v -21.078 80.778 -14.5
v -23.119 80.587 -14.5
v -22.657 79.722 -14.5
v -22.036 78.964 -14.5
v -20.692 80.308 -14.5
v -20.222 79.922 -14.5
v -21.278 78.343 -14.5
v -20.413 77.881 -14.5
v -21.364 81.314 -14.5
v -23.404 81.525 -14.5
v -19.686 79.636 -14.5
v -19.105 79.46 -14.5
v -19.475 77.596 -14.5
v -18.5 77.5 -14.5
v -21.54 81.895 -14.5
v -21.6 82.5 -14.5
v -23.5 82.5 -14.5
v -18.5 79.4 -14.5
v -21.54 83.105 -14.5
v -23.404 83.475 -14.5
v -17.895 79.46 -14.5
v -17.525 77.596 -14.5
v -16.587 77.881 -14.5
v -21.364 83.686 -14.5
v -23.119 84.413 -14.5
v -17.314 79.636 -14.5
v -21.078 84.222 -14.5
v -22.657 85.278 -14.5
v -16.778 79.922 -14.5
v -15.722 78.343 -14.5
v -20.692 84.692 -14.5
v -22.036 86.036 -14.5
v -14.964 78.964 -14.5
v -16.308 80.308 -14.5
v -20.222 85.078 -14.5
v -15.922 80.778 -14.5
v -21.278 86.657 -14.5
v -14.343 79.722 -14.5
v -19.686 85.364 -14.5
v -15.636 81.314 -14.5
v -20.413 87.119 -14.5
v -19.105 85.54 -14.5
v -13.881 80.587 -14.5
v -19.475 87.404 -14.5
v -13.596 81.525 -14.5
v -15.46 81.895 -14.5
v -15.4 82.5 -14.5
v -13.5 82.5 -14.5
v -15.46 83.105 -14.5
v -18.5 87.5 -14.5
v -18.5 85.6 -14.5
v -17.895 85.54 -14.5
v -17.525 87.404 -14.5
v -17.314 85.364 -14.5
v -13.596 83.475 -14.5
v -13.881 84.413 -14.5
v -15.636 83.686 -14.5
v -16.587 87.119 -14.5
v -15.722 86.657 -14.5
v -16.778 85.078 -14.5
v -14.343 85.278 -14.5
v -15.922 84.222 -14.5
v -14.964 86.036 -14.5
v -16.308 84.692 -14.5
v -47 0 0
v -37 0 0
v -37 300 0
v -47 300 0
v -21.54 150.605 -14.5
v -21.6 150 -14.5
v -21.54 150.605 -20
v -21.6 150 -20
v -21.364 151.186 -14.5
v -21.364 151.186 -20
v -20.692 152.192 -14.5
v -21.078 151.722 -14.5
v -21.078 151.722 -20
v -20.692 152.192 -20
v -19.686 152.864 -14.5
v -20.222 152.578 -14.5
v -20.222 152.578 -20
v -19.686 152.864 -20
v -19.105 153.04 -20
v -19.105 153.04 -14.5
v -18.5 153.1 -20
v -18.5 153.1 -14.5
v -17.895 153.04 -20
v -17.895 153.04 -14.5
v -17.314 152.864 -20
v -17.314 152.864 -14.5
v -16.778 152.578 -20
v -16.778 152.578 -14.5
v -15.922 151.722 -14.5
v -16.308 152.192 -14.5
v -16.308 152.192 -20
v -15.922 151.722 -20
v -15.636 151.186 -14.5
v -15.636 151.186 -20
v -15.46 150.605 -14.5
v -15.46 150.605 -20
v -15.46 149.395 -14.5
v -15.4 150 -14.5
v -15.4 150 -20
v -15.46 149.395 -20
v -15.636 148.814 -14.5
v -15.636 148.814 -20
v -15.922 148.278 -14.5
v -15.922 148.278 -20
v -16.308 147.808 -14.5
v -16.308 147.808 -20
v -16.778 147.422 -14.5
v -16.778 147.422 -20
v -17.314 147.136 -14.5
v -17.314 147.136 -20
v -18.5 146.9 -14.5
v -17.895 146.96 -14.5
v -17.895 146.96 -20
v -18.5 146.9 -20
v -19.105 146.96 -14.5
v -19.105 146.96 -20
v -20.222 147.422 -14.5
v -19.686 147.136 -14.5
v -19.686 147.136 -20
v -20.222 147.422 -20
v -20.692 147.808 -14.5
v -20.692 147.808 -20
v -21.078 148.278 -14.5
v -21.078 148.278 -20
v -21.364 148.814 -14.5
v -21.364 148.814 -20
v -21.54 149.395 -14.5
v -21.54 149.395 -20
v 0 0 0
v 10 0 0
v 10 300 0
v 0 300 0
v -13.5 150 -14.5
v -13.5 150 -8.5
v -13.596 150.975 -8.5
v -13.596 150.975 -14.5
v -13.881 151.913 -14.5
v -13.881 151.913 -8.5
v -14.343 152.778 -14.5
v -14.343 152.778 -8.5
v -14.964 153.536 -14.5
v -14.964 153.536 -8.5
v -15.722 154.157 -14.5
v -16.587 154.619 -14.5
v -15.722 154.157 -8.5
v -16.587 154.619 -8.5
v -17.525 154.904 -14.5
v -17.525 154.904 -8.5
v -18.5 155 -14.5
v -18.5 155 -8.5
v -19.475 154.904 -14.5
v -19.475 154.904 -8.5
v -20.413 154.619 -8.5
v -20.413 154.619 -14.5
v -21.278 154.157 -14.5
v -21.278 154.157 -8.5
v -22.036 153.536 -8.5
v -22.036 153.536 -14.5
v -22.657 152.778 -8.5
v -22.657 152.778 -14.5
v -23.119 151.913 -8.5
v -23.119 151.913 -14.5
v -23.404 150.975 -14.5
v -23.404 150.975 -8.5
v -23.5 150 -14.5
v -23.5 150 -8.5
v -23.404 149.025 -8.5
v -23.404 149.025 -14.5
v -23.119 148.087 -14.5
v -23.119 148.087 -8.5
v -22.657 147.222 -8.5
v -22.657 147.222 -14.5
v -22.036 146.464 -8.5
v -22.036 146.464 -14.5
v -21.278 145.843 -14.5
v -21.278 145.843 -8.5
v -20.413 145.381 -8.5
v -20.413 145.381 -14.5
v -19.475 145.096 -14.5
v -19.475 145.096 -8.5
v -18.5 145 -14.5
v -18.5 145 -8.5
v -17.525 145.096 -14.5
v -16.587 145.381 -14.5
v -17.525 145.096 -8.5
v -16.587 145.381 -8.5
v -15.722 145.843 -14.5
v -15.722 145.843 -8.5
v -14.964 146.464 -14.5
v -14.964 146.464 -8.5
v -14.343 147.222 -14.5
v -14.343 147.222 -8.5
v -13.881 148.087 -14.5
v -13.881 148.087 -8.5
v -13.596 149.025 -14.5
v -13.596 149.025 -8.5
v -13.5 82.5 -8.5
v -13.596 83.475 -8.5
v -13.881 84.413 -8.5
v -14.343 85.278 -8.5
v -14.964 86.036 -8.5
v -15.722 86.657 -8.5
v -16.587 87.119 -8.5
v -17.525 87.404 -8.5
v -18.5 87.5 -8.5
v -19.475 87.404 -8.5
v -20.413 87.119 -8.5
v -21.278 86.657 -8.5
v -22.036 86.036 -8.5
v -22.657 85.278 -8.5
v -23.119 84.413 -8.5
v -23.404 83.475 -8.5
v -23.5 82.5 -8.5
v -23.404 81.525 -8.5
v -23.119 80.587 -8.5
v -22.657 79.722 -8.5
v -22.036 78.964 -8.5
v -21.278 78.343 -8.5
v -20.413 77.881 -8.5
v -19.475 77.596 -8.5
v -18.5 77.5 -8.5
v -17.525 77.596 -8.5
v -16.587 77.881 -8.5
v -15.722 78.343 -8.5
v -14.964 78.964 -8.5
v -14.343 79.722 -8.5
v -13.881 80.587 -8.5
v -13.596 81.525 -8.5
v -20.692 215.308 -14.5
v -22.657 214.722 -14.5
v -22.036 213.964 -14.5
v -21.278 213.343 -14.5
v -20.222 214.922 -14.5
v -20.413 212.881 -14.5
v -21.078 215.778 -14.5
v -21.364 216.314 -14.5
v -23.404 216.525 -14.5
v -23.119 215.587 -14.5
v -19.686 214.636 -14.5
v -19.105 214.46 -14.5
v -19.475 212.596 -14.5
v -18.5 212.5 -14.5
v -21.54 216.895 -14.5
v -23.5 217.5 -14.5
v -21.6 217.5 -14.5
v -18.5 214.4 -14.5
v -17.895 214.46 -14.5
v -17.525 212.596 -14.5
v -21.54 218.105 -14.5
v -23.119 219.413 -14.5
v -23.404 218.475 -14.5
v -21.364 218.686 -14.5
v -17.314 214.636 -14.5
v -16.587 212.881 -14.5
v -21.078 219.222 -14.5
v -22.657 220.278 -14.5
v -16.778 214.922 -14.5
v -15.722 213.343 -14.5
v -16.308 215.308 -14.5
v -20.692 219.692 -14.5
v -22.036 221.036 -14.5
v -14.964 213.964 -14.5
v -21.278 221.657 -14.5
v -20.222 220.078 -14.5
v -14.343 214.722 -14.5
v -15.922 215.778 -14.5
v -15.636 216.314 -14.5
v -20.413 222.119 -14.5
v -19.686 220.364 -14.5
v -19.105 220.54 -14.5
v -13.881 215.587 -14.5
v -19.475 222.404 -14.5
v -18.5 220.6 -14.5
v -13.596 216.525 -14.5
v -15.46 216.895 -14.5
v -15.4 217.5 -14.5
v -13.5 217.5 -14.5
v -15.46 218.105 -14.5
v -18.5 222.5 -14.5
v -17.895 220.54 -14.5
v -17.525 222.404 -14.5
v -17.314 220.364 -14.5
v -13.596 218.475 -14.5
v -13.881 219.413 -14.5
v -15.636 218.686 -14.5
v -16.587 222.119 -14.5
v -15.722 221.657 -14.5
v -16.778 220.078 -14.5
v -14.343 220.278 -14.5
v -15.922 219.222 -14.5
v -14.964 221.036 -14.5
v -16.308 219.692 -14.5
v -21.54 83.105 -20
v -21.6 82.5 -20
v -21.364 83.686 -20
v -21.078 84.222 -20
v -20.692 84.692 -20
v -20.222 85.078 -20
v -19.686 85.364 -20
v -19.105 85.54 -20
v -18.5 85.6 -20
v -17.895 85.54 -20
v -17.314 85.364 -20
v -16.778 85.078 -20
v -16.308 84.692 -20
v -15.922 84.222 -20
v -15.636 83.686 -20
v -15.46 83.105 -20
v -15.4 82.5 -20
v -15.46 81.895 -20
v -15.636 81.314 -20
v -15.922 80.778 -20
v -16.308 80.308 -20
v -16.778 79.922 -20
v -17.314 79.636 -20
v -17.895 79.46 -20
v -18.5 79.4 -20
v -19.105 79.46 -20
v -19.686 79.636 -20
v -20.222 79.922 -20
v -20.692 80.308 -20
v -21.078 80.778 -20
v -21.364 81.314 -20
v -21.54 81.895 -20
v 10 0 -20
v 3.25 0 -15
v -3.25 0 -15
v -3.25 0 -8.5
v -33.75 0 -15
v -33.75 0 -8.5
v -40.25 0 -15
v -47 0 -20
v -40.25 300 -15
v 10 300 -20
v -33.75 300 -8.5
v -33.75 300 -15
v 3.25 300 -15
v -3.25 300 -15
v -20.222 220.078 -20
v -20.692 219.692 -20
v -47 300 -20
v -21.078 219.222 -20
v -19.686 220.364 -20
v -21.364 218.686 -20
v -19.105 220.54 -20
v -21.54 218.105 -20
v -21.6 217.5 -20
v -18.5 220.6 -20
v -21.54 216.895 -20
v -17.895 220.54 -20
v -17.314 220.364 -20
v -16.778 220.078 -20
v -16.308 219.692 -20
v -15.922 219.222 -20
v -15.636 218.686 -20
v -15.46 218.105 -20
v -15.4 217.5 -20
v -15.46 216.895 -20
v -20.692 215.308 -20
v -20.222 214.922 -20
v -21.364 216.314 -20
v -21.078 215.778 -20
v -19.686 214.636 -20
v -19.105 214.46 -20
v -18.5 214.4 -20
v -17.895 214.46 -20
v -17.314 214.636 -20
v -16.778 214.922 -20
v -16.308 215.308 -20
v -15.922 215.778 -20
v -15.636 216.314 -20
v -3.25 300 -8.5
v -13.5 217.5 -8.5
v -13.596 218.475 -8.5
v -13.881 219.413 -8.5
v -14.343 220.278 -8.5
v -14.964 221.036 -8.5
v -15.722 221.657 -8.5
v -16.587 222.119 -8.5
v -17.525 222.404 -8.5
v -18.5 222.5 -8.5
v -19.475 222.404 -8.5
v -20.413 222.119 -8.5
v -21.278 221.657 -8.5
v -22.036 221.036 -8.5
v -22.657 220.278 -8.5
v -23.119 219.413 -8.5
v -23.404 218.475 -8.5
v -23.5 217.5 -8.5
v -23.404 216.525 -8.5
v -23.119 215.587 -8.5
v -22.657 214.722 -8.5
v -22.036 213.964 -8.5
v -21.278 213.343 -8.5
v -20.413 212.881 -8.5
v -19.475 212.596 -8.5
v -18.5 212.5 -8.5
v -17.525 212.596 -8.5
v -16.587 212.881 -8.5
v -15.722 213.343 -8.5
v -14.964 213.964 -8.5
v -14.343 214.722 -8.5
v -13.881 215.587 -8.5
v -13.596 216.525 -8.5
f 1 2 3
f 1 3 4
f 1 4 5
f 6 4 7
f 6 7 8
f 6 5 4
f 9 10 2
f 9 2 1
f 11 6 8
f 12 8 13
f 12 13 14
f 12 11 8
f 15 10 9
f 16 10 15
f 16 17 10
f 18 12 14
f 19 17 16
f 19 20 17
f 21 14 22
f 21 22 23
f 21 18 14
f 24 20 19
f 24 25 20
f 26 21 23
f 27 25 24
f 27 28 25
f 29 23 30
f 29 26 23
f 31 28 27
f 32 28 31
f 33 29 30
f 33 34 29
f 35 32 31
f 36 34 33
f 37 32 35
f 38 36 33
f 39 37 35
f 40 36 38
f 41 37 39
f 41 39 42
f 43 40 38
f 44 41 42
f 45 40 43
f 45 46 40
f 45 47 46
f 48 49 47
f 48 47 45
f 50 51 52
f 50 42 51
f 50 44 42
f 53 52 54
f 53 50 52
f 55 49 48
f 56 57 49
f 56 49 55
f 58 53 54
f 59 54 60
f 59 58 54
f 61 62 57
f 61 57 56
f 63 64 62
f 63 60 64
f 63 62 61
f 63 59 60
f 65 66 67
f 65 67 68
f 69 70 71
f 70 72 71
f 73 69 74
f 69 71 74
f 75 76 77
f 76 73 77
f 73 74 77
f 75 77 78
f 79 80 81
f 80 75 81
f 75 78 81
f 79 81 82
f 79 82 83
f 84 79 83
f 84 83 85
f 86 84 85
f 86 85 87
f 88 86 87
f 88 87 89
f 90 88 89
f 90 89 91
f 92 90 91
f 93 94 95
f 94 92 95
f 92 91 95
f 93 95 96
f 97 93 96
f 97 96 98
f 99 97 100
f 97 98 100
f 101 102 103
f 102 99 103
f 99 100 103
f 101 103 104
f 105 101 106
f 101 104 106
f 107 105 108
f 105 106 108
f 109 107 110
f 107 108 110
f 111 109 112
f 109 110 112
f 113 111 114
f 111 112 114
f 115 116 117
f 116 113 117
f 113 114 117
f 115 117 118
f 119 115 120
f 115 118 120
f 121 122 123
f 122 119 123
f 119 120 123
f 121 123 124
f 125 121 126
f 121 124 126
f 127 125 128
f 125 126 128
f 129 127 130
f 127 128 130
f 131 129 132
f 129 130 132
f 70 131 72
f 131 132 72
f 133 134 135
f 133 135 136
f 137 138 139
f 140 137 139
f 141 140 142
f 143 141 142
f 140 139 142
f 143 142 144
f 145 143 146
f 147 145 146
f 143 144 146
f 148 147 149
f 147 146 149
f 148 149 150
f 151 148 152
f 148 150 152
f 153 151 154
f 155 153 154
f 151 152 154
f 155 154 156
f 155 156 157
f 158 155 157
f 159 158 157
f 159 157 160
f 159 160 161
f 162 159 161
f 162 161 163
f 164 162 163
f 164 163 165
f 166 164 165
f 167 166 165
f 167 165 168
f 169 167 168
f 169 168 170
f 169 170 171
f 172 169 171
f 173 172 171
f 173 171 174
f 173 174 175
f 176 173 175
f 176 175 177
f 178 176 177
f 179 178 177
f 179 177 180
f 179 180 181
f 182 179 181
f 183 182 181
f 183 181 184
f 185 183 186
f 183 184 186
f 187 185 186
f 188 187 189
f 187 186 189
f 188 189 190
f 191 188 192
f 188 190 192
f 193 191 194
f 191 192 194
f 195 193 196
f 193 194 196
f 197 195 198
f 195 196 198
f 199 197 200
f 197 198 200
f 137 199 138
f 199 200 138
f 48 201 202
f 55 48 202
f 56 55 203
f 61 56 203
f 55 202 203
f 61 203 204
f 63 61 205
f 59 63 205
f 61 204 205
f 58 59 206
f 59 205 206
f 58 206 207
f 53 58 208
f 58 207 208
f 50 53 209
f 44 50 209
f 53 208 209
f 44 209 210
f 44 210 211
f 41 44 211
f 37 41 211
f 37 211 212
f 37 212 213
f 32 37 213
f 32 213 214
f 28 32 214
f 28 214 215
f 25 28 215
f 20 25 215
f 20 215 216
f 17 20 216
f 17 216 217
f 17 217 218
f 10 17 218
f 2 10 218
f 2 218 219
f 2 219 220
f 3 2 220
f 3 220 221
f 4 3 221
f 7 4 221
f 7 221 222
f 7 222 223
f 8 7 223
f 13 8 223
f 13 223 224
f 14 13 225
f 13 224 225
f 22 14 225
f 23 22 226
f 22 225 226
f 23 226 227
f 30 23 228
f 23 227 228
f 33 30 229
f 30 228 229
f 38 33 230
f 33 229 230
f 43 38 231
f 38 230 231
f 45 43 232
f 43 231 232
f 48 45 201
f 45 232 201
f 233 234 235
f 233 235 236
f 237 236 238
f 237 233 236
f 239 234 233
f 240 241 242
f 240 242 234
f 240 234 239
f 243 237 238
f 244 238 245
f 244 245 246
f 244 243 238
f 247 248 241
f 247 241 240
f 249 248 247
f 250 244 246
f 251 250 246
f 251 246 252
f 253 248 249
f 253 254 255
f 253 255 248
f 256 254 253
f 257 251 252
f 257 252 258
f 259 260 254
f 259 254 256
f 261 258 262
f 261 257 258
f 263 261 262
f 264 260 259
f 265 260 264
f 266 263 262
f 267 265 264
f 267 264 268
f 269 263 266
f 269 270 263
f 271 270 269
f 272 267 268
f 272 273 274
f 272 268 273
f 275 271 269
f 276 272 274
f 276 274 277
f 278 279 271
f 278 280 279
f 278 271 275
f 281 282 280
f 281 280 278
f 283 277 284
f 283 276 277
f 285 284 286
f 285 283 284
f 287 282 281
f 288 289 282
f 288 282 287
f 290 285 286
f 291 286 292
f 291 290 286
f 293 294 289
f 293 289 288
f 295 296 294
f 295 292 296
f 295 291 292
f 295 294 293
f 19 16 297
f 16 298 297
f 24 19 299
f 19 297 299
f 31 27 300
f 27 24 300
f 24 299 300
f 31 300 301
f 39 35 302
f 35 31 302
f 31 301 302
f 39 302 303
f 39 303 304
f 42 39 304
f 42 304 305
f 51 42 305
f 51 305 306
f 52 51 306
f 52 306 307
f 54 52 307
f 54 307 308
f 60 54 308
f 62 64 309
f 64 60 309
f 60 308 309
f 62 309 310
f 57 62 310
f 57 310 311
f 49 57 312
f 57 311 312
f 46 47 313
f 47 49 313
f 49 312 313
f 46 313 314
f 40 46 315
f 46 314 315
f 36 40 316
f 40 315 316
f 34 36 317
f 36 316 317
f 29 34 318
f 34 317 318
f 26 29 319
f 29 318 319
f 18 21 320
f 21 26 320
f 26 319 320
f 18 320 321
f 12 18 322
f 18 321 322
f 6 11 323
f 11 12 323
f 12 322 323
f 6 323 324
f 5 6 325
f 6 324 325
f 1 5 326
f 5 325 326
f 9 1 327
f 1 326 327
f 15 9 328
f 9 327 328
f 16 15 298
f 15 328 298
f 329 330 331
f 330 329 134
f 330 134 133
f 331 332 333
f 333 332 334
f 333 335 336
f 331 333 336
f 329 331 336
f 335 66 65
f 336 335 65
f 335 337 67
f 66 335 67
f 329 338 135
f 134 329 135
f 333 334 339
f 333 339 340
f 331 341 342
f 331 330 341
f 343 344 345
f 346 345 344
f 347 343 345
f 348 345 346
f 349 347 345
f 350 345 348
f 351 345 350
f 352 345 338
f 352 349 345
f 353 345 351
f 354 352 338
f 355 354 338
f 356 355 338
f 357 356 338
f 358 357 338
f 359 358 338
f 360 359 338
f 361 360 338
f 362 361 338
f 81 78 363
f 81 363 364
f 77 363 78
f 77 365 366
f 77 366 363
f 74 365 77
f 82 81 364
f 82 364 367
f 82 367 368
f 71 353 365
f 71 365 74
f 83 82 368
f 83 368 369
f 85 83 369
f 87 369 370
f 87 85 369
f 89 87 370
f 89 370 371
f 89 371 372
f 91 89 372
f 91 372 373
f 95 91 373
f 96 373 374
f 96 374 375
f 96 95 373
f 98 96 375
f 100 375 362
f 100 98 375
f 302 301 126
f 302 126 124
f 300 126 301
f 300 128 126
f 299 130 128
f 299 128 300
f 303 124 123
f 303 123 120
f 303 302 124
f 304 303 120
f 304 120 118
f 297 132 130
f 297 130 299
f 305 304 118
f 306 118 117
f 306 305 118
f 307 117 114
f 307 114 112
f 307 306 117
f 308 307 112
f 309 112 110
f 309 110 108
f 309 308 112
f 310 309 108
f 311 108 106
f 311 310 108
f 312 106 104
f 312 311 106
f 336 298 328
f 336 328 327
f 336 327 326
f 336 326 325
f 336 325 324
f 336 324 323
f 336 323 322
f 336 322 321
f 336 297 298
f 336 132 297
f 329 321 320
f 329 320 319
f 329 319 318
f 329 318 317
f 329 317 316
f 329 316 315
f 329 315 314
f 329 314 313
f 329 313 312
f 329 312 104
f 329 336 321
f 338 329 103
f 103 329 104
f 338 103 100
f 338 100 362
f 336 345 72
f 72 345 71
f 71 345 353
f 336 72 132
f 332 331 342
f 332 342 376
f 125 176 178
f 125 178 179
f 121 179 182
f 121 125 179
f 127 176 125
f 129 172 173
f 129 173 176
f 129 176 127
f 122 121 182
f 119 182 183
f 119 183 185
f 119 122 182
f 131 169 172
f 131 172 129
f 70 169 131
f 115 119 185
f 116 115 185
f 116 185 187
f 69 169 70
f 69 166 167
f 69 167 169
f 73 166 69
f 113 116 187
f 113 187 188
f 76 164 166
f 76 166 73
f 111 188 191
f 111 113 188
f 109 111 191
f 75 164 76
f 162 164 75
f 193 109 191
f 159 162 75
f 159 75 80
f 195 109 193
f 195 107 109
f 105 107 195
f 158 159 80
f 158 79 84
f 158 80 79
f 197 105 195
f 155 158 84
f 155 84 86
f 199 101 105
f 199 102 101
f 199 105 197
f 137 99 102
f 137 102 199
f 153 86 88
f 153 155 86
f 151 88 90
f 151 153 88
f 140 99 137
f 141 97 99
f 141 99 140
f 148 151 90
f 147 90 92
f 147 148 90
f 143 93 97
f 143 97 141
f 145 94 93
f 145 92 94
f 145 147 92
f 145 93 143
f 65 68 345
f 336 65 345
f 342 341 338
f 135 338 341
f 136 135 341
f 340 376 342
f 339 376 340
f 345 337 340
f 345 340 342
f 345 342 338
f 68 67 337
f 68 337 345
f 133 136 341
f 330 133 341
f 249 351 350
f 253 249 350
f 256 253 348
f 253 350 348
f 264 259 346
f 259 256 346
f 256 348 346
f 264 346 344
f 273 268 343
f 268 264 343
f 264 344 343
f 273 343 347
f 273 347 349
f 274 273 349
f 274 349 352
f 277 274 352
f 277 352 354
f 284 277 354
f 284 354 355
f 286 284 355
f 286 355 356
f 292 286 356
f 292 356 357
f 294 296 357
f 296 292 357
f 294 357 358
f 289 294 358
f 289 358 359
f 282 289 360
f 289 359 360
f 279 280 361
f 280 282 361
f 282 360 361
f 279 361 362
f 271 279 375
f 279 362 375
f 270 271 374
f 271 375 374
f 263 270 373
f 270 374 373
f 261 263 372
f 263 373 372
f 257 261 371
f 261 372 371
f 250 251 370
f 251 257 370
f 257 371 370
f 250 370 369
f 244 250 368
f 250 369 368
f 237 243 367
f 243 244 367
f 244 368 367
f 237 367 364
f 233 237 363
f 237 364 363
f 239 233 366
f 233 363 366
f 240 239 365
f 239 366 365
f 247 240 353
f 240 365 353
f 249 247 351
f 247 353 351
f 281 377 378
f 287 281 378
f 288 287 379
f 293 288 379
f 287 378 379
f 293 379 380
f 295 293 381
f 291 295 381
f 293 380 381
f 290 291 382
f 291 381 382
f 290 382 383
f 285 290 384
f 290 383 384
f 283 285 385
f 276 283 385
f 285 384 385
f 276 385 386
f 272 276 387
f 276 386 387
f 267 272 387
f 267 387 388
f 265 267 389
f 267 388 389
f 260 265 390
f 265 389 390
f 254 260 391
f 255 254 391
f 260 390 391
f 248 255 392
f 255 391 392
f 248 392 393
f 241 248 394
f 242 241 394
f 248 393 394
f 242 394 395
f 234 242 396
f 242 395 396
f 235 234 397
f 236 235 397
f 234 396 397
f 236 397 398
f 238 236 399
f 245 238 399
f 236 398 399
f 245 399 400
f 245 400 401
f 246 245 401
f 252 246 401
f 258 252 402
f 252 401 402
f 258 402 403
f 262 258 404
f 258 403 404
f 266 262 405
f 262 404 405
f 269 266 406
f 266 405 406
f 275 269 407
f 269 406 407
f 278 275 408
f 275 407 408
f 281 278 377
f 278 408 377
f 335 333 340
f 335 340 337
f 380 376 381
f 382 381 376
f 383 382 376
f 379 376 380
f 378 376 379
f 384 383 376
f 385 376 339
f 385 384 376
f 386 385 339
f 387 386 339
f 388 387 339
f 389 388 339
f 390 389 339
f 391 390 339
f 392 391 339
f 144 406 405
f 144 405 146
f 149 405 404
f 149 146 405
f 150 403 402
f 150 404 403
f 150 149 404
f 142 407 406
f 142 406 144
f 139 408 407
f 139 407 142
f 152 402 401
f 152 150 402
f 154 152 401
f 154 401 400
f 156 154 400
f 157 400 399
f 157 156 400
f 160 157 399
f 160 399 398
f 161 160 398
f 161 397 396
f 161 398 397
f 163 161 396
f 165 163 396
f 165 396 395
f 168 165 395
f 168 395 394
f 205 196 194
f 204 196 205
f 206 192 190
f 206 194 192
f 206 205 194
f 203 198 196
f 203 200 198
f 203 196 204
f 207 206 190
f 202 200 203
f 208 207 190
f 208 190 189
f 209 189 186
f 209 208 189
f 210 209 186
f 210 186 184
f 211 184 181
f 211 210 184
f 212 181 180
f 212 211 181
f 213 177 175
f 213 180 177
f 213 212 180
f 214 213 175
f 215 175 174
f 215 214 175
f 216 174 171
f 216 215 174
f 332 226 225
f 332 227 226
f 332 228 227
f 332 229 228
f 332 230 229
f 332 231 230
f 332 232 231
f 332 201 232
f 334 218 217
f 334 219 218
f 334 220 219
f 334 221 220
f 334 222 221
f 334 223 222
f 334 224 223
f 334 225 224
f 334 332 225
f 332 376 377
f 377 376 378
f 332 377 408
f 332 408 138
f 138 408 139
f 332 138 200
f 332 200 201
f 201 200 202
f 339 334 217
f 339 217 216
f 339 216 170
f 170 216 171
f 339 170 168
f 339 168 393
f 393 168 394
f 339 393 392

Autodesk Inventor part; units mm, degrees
ref_plane "YZ Plane" through (0, 0, 0) normal (1, 0, 0) x (0, 1, 0)
ref_plane "XZ Plane" through (0, 0, 0) normal (0, 1, 0) x (-1, 0, 0)
ref_plane "XY Plane" through (0, 0, 0) normal (0, 0, 1) x (1, 0, 0)
sketch "Sketch1" plane through (0, 0, 0) normal (0, 1, 0) x (-1, 0, 0)
  line L0 (37, 0) -> (0, 0)
  line L1 (0, 0) -> (-3.25, -15)
  line L2 (-3.25, -15) -> (3.25, -15)
  line L3 (3.25, -15) -> (3.25, -8.5)
  line L4 (3.25, -8.5) -> (33.75, -8.5)
  line L5 (33.75, -8.5) -> (33.75, -15)
  line L6 (33.75, -15) -> (40.25, -15)
  line L7 (40.25, -15) -> (37, 0)
  line L8 (37, 0) -> (47, 0)
  line L9 (47, 0) -> (47, -20)
  line L10 (47, -20) -> (-10, -20)
  line L11 (-10, -20) -> (-10, 0)
  line L12 (-10, 0) -> (0, 0)
  dimension "d1" = 20
  dimension "d5" = 10
  dimension "d6" = 10
extrude "Extrusion1" add sketch "Sketch1" along normal blind 300 contours L8 L9 L10 L11 L12 L1 L2 L3 L4 L5 L6 L7
sketch "Sketch2" plane through (10, 0, -20) normal (0, 0, -1) x (-1, 0, 0)
  line L0 (0, 0) -> (57, 0) projected
  line L1 (57, 0) -> (57, 300) projected
  line L2 (0, 300) -> (57, 300) projected
  line L3 (0, 0) -> (0, 300) projected
  line L4 (43.75, 0) -> (13.25, 0) projected
  line L5 (28.5, 0) -> (28.5, 300)
  line L6 (43.75, 300) -> (13.25, 300) projected
  line L7 (0, 52.5) -> (57, 52.5)
  line L8 (57, 52.5) -> (57, 247.5)
  line L9 (57, 247.5) -> (0, 247.5)
  line L10 (0, 247.5) -> (0, 52.5)
  line L11 (0, 52.5) -> (57, 247.5) construction
  line L12 (57, 52.5) -> (0, 247.5) construction
  circle A0 centre (28.5, 150) radius 3.1
  line L13 (28.5, 52.5) -> (28.5, 82.5)
  circle A1 centre (28.5, 82.5) radius 3.1
  line L14 (28.5, 247.5) -> (28.5, 217.5)
  circle A2 centre (28.5, 217.5) radius 3.1
  point P0 (10, 0)
  dimension "d7" = 195
  dimension "d8" = 6.2
  dimension "d9" = 30
  dimension "d10" = 6.2
  dimension "d11" = 30
  dimension "d12" = 6.2
extrude "Extrusion2" cut sketch "Sketch2" against normal up to surface (11.5 mm away) contours A1 L5 | L5 A1 | A2 L5 | L5 A2 | A0 L5 | L5 A0
sketch "Sketch4" plane through (-33.75, 0, -8.5) normal (0, 0, 1) x (1, 0, 0)
  circle A0 centre (15.25, 217.5) radius 3.1 projected
  circle A1 centre (15.25, 82.5) radius 3.1 projected
  circle A2 centre (15.25, 150) radius 3.1 projected
  line L0 (0, 0) -> (30.5, 0) projected
  line L1 (30.5, 0) -> (30.5, 300) projected
  line L2 (0, 300) -> (30.5, 300) projected
  line L3 (0, 0) -> (0, 300) projected
  circle A3 centre (15.25, 82.5) radius 3.1 projected
  circle A4 centre (15.25, 82.5) radius 5
  circle A5 centre (15.25, 150) radius 5
  circle A6 centre (15.25, 217.5) radius 5
  point P0 (33.75, 0)
  dimension "d15" = 10
  dimension "d16" = 10
  dimension "d17" = 10
extrude "Extrusion3" cut sketch "Sketch4" against normal blind 6 contours A4 | A5 | A6
properties part number "uchwyt_szyny"
